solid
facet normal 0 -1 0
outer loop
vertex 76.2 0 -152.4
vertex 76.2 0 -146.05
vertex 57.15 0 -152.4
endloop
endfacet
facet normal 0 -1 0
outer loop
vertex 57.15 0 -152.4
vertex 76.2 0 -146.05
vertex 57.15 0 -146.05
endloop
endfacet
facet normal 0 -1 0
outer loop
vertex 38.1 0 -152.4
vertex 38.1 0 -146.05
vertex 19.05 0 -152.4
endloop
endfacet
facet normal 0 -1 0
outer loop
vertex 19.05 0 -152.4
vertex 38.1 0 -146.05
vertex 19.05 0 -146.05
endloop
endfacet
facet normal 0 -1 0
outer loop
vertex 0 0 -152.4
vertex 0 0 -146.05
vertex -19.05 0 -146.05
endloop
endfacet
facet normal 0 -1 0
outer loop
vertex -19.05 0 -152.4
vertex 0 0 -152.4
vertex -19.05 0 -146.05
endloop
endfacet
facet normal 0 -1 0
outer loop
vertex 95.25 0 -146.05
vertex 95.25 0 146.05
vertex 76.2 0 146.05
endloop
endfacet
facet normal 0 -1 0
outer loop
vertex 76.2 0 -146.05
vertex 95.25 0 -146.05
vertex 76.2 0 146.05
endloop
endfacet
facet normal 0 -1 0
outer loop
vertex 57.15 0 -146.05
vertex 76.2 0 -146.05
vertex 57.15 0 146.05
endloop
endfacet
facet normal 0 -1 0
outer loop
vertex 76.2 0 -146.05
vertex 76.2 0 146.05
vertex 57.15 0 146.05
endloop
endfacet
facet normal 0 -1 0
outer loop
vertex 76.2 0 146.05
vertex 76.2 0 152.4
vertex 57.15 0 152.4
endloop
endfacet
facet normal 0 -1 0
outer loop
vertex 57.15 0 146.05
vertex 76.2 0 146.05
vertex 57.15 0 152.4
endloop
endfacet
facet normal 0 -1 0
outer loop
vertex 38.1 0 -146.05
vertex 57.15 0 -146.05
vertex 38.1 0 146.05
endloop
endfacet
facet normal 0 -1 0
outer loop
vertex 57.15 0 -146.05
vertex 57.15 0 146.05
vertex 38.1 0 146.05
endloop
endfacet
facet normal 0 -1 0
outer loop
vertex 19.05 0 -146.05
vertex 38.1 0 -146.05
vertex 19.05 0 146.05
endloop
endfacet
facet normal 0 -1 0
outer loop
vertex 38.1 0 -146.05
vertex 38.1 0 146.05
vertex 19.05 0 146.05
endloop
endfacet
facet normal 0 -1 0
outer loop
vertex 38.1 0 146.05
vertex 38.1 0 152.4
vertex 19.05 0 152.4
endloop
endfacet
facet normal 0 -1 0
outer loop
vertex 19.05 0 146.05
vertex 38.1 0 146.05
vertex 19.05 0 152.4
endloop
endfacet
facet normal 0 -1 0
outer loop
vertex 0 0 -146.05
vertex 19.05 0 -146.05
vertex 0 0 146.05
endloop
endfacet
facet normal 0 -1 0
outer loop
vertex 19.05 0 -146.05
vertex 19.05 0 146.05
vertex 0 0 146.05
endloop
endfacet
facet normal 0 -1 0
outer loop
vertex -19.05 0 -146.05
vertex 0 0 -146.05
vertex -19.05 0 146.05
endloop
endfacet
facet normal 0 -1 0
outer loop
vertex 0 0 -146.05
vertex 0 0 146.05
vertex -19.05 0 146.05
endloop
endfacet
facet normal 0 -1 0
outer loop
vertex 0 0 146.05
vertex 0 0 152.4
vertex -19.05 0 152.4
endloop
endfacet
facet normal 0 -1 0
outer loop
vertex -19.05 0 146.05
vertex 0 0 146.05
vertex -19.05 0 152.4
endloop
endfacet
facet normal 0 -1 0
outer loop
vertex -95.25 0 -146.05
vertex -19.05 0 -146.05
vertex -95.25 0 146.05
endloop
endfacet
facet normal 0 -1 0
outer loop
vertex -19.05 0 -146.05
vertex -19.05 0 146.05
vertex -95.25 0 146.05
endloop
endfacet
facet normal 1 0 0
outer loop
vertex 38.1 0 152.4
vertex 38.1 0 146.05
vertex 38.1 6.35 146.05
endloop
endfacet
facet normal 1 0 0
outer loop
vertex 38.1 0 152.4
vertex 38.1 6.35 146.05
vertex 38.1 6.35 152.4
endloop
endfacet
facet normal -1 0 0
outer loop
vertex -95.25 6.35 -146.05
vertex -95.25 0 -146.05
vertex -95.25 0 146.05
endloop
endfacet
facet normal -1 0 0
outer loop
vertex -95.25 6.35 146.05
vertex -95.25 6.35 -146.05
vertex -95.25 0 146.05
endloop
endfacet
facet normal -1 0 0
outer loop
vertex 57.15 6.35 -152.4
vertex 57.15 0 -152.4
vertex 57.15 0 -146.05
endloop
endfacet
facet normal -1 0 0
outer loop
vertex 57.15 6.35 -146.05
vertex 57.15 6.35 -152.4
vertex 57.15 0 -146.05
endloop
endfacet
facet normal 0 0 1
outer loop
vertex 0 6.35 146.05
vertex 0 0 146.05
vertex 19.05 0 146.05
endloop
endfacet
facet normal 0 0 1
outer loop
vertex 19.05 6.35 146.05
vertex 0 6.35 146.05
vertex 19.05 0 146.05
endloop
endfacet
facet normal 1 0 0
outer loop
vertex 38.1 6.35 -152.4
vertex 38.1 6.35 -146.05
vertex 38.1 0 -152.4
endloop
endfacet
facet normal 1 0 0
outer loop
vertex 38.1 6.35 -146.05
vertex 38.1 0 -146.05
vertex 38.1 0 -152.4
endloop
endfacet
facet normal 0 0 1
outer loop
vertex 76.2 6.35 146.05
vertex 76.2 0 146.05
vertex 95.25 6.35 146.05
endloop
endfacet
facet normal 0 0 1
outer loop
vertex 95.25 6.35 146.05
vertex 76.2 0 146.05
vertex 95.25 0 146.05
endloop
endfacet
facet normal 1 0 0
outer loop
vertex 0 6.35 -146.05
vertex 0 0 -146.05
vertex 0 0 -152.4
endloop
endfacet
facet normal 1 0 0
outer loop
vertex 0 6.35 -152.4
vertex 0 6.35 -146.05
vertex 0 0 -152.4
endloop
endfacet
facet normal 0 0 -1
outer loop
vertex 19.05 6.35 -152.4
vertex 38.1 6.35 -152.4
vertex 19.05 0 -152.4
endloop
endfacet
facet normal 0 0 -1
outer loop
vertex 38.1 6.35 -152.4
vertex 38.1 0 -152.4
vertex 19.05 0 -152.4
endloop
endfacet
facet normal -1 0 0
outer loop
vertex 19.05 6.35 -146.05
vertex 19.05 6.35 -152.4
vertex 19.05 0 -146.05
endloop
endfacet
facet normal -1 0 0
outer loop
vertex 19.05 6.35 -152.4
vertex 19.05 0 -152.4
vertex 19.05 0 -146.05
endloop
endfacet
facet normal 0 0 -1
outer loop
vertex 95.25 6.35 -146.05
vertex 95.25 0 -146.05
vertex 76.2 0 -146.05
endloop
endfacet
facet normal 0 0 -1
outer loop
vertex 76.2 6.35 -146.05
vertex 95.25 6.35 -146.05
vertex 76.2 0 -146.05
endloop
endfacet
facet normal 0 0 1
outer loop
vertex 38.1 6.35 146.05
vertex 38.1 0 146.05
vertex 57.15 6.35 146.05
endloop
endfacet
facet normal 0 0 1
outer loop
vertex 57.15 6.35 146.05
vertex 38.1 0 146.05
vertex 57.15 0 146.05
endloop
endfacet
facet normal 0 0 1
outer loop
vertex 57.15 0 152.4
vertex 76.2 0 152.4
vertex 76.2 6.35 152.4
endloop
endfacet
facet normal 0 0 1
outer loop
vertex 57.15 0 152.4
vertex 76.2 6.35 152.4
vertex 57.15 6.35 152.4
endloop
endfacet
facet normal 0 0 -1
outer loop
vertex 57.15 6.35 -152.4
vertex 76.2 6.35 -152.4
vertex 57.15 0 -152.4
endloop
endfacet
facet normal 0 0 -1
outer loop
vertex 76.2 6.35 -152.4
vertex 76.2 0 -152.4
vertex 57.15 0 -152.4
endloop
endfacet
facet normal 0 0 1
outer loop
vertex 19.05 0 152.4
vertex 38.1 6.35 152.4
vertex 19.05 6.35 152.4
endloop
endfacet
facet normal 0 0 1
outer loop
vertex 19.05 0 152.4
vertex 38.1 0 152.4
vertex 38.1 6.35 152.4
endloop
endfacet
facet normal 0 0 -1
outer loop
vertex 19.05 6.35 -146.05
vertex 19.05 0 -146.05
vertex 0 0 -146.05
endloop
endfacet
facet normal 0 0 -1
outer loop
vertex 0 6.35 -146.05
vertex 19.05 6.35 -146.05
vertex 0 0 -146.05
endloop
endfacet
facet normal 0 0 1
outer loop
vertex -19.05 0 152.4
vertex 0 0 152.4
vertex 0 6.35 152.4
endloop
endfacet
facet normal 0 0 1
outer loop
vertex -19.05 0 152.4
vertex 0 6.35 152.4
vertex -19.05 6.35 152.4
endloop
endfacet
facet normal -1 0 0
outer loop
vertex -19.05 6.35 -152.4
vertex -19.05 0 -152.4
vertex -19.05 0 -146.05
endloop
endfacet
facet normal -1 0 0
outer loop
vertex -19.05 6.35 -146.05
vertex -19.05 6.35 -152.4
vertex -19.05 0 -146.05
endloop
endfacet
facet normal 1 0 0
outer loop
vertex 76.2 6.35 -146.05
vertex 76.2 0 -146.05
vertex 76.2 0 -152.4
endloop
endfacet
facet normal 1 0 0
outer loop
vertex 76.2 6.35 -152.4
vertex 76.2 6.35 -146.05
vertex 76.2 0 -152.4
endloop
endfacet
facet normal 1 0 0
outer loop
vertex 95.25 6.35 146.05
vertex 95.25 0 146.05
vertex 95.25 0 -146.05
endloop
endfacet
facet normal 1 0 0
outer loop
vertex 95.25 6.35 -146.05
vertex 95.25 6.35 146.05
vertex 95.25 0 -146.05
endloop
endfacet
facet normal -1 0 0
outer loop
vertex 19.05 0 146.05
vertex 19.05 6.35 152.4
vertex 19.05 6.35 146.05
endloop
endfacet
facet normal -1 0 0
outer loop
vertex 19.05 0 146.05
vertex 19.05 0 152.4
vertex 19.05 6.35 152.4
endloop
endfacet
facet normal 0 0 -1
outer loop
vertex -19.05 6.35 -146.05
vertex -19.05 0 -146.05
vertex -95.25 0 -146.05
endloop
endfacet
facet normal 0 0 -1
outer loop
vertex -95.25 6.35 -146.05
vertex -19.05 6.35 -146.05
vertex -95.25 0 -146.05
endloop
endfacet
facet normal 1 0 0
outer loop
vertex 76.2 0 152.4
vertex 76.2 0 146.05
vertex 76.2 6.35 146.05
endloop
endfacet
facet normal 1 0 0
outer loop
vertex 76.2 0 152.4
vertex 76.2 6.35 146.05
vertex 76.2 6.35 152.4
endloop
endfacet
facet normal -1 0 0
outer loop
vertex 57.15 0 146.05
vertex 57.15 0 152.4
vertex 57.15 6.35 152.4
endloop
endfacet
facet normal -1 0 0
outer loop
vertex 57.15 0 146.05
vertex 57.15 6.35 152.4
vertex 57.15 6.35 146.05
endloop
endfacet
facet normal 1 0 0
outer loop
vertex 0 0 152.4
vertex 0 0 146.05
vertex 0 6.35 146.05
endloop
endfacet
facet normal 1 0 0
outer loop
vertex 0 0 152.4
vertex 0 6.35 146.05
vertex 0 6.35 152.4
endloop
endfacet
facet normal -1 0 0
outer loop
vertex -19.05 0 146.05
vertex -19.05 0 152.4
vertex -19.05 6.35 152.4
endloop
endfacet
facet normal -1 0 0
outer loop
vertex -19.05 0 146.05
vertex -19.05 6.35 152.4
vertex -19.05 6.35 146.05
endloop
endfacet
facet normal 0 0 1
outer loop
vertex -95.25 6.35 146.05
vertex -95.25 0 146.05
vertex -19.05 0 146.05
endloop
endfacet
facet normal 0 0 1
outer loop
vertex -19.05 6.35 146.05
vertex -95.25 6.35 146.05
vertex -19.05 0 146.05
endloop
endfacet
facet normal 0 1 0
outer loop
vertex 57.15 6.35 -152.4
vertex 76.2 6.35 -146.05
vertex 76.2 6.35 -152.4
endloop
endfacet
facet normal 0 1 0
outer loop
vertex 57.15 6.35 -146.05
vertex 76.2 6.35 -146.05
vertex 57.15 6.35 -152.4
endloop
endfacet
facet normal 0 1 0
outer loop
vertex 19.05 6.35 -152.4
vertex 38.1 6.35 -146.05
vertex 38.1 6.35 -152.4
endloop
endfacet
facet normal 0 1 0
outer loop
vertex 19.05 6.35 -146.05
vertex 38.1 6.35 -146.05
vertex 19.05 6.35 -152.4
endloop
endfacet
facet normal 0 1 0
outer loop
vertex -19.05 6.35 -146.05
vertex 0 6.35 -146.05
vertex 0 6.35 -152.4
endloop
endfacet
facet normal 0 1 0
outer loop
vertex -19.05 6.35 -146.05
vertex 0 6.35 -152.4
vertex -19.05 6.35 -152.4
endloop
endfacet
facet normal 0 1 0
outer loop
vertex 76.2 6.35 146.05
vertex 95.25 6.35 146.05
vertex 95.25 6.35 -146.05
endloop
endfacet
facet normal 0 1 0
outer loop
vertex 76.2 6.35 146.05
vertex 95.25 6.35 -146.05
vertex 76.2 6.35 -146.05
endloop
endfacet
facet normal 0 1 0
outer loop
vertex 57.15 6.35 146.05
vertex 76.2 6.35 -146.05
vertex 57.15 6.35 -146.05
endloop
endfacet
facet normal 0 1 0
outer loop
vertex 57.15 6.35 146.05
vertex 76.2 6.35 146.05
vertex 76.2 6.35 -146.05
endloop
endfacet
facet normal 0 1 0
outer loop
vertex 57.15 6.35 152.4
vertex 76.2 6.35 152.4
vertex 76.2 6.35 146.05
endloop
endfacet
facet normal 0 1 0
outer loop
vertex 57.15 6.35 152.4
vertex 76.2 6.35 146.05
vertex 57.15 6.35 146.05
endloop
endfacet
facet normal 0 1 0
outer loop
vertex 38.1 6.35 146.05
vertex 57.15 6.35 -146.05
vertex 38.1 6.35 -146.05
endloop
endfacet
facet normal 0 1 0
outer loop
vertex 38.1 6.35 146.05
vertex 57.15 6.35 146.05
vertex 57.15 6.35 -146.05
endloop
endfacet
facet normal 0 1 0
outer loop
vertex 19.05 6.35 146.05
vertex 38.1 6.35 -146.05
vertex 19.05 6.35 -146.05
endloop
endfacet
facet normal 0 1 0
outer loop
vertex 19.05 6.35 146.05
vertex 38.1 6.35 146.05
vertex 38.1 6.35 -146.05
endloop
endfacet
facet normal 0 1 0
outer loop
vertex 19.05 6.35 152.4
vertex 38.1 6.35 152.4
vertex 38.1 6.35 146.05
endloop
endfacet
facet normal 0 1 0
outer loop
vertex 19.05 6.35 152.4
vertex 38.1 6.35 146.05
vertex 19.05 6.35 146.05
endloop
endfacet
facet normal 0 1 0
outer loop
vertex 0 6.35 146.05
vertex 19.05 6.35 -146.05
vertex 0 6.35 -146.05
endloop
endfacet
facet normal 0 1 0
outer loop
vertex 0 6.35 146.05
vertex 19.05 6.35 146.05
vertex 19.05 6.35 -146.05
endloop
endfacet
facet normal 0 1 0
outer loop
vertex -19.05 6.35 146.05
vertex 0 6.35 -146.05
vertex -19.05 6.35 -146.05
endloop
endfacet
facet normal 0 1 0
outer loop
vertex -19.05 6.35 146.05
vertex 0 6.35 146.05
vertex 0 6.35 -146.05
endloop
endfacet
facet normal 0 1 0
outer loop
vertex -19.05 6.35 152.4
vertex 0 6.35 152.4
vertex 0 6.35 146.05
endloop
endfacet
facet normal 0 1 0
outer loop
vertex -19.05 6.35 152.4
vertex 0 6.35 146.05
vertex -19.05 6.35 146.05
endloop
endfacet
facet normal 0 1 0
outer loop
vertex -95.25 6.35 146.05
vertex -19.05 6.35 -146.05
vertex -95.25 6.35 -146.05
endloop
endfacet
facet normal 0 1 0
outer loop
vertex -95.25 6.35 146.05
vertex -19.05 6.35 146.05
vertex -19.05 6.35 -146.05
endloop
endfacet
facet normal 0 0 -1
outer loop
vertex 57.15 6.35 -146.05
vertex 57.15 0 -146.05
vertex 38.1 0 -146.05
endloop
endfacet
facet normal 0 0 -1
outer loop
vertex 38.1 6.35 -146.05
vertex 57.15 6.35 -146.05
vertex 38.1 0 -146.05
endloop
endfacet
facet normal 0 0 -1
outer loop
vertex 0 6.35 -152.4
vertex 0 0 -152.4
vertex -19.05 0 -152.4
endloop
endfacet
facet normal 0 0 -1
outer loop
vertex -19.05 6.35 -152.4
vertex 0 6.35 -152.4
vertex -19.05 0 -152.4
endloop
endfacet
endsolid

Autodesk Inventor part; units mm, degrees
ref_plane "YZ Plane" through (0, 0, 0) normal (1, 0, 0) x (0, 1, 0)
ref_plane "XZ Plane" through (0, 0, 0) normal (0, 1, 0) x (-1, 0, 0)
ref_plane "XY Plane" through (0, 0, 0) normal (0, 0, 1) x (1, 0, 0)
sketch "Sketch1" plane through (0, 0, 0) normal (0, 1, 0) x (-1, 0, 0)
  line L0 (95.25, 146.05) -> (-95.25, 146.05)
  line L1 (-95.25, 146.05) -> (-95.25, -146.05)
  line L2 (-95.25, -146.05) -> (95.25, -146.05)
  line L3 (95.25, -146.05) -> (95.25, 146.05)
  line L4 (95.25, 146.05) -> (-95.25, -146.05) construction
  line L5 (-95.25, 146.05) -> (95.25, -146.05) construction
  line L6 (95.25, -146.05) -> (76.2, -146.05)
  line L7 (76.2, -146.05) -> (76.2, -152.4)
  line L8 (76.2, -152.4) -> (95.25, -152.4)
  line L9 (95.25, -152.4) -> (95.25, -146.05)
  line L10 (38.1, -146.05) -> (38.1, -152.4)
  line L11 (57.15, -146.05) -> (38.1, -146.05)
  line L12 (38.1, -152.4) -> (57.15, -152.4)
  line L13 (57.15, -152.4) -> (57.15, -146.05)
  line L14 (0, -146.05) -> (0, -152.4)
  line L15 (19.05, -146.05) -> (0, -146.05)
  line L16 (0, -152.4) -> (19.05, -152.4)
  line L17 (19.05, -152.4) -> (19.05, -146.05)
  line L18 (-38.1, -146.05) -> (-38.1, -152.4)
  line L19 (-19.05, -146.05) -> (-38.1, -146.05)
  line L20 (-38.1, -152.4) -> (-19.05, -152.4)
  line L21 (-19.05, -152.4) -> (-19.05, -146.05)
  line L22 (-76.2, -146.05) -> (-76.2, -152.4)
  line L23 (-57.15, -146.05) -> (-76.2, -146.05)
  line L24 (-76.2, -152.4) -> (-57.15, -152.4)
  line L25 (-57.15, -152.4) -> (-57.15, -146.05)
  line L26 (95.25, 0) -> (-95.25, 0) construction
  line L27 (95.25, 146.05) -> (76.2, 146.05)
  line L28 (76.2, 146.05) -> (76.2, 152.4)
  line L29 (76.2, 152.4) -> (95.25, 152.4)
  line L30 (95.25, 152.4) -> (95.25, 146.05)
  line L31 (57.15, 146.05) -> (38.1, 146.05)
  line L32 (38.1, 146.05) -> (38.1, 152.4)
  line L33 (38.1, 152.4) -> (57.15, 152.4)
  line L34 (57.15, 152.4) -> (57.15, 146.05)
  line L35 (19.05, 146.05) -> (0, 146.05)
  line L36 (0, 146.05) -> (0, 152.4)
  line L37 (0, 152.4) -> (19.05, 152.4)
  line L38 (19.05, 152.4) -> (19.05, 146.05)
  line L39 (-19.05, 146.05) -> (-38.1, 146.05)
  line L40 (-38.1, 146.05) -> (-38.1, 152.4)
  line L41 (-38.1, 152.4) -> (-19.05, 152.4)
  line L42 (-19.05, 152.4) -> (-19.05, 146.05)
  line L43 (-57.15, 146.05) -> (-76.2, 146.05)
  line L44 (-76.2, 146.05) -> (-76.2, 152.4)
  line L45 (-76.2, 152.4) -> (-57.15, 152.4)
  line L46 (-57.15, 152.4) -> (-57.15, 146.05)
  point P0 (0, 0)
  dimension "d0" = 292.1
  dimension "d1" = 190.5
  dimension "d2" = 19.05
  dimension "d3" = 6.35
  dimension "d6" = 38.1
  dimension "d11" = 19.05
  dimension "d12" = 6.35
  dimension "d15" = 38.1
extrude "Extrusion2" add sketch "Sketch1" along normal blind 6.35 contours L3 L2 L1 L0 | L0 L36 L37 L38 | L17 L16 L14 L2 | L0 L40 L41 L42 | L21 L20 L18 L2 | L0 L44 L45 L46 | L25 L24 L22 L2
properties part number "ramp2"
